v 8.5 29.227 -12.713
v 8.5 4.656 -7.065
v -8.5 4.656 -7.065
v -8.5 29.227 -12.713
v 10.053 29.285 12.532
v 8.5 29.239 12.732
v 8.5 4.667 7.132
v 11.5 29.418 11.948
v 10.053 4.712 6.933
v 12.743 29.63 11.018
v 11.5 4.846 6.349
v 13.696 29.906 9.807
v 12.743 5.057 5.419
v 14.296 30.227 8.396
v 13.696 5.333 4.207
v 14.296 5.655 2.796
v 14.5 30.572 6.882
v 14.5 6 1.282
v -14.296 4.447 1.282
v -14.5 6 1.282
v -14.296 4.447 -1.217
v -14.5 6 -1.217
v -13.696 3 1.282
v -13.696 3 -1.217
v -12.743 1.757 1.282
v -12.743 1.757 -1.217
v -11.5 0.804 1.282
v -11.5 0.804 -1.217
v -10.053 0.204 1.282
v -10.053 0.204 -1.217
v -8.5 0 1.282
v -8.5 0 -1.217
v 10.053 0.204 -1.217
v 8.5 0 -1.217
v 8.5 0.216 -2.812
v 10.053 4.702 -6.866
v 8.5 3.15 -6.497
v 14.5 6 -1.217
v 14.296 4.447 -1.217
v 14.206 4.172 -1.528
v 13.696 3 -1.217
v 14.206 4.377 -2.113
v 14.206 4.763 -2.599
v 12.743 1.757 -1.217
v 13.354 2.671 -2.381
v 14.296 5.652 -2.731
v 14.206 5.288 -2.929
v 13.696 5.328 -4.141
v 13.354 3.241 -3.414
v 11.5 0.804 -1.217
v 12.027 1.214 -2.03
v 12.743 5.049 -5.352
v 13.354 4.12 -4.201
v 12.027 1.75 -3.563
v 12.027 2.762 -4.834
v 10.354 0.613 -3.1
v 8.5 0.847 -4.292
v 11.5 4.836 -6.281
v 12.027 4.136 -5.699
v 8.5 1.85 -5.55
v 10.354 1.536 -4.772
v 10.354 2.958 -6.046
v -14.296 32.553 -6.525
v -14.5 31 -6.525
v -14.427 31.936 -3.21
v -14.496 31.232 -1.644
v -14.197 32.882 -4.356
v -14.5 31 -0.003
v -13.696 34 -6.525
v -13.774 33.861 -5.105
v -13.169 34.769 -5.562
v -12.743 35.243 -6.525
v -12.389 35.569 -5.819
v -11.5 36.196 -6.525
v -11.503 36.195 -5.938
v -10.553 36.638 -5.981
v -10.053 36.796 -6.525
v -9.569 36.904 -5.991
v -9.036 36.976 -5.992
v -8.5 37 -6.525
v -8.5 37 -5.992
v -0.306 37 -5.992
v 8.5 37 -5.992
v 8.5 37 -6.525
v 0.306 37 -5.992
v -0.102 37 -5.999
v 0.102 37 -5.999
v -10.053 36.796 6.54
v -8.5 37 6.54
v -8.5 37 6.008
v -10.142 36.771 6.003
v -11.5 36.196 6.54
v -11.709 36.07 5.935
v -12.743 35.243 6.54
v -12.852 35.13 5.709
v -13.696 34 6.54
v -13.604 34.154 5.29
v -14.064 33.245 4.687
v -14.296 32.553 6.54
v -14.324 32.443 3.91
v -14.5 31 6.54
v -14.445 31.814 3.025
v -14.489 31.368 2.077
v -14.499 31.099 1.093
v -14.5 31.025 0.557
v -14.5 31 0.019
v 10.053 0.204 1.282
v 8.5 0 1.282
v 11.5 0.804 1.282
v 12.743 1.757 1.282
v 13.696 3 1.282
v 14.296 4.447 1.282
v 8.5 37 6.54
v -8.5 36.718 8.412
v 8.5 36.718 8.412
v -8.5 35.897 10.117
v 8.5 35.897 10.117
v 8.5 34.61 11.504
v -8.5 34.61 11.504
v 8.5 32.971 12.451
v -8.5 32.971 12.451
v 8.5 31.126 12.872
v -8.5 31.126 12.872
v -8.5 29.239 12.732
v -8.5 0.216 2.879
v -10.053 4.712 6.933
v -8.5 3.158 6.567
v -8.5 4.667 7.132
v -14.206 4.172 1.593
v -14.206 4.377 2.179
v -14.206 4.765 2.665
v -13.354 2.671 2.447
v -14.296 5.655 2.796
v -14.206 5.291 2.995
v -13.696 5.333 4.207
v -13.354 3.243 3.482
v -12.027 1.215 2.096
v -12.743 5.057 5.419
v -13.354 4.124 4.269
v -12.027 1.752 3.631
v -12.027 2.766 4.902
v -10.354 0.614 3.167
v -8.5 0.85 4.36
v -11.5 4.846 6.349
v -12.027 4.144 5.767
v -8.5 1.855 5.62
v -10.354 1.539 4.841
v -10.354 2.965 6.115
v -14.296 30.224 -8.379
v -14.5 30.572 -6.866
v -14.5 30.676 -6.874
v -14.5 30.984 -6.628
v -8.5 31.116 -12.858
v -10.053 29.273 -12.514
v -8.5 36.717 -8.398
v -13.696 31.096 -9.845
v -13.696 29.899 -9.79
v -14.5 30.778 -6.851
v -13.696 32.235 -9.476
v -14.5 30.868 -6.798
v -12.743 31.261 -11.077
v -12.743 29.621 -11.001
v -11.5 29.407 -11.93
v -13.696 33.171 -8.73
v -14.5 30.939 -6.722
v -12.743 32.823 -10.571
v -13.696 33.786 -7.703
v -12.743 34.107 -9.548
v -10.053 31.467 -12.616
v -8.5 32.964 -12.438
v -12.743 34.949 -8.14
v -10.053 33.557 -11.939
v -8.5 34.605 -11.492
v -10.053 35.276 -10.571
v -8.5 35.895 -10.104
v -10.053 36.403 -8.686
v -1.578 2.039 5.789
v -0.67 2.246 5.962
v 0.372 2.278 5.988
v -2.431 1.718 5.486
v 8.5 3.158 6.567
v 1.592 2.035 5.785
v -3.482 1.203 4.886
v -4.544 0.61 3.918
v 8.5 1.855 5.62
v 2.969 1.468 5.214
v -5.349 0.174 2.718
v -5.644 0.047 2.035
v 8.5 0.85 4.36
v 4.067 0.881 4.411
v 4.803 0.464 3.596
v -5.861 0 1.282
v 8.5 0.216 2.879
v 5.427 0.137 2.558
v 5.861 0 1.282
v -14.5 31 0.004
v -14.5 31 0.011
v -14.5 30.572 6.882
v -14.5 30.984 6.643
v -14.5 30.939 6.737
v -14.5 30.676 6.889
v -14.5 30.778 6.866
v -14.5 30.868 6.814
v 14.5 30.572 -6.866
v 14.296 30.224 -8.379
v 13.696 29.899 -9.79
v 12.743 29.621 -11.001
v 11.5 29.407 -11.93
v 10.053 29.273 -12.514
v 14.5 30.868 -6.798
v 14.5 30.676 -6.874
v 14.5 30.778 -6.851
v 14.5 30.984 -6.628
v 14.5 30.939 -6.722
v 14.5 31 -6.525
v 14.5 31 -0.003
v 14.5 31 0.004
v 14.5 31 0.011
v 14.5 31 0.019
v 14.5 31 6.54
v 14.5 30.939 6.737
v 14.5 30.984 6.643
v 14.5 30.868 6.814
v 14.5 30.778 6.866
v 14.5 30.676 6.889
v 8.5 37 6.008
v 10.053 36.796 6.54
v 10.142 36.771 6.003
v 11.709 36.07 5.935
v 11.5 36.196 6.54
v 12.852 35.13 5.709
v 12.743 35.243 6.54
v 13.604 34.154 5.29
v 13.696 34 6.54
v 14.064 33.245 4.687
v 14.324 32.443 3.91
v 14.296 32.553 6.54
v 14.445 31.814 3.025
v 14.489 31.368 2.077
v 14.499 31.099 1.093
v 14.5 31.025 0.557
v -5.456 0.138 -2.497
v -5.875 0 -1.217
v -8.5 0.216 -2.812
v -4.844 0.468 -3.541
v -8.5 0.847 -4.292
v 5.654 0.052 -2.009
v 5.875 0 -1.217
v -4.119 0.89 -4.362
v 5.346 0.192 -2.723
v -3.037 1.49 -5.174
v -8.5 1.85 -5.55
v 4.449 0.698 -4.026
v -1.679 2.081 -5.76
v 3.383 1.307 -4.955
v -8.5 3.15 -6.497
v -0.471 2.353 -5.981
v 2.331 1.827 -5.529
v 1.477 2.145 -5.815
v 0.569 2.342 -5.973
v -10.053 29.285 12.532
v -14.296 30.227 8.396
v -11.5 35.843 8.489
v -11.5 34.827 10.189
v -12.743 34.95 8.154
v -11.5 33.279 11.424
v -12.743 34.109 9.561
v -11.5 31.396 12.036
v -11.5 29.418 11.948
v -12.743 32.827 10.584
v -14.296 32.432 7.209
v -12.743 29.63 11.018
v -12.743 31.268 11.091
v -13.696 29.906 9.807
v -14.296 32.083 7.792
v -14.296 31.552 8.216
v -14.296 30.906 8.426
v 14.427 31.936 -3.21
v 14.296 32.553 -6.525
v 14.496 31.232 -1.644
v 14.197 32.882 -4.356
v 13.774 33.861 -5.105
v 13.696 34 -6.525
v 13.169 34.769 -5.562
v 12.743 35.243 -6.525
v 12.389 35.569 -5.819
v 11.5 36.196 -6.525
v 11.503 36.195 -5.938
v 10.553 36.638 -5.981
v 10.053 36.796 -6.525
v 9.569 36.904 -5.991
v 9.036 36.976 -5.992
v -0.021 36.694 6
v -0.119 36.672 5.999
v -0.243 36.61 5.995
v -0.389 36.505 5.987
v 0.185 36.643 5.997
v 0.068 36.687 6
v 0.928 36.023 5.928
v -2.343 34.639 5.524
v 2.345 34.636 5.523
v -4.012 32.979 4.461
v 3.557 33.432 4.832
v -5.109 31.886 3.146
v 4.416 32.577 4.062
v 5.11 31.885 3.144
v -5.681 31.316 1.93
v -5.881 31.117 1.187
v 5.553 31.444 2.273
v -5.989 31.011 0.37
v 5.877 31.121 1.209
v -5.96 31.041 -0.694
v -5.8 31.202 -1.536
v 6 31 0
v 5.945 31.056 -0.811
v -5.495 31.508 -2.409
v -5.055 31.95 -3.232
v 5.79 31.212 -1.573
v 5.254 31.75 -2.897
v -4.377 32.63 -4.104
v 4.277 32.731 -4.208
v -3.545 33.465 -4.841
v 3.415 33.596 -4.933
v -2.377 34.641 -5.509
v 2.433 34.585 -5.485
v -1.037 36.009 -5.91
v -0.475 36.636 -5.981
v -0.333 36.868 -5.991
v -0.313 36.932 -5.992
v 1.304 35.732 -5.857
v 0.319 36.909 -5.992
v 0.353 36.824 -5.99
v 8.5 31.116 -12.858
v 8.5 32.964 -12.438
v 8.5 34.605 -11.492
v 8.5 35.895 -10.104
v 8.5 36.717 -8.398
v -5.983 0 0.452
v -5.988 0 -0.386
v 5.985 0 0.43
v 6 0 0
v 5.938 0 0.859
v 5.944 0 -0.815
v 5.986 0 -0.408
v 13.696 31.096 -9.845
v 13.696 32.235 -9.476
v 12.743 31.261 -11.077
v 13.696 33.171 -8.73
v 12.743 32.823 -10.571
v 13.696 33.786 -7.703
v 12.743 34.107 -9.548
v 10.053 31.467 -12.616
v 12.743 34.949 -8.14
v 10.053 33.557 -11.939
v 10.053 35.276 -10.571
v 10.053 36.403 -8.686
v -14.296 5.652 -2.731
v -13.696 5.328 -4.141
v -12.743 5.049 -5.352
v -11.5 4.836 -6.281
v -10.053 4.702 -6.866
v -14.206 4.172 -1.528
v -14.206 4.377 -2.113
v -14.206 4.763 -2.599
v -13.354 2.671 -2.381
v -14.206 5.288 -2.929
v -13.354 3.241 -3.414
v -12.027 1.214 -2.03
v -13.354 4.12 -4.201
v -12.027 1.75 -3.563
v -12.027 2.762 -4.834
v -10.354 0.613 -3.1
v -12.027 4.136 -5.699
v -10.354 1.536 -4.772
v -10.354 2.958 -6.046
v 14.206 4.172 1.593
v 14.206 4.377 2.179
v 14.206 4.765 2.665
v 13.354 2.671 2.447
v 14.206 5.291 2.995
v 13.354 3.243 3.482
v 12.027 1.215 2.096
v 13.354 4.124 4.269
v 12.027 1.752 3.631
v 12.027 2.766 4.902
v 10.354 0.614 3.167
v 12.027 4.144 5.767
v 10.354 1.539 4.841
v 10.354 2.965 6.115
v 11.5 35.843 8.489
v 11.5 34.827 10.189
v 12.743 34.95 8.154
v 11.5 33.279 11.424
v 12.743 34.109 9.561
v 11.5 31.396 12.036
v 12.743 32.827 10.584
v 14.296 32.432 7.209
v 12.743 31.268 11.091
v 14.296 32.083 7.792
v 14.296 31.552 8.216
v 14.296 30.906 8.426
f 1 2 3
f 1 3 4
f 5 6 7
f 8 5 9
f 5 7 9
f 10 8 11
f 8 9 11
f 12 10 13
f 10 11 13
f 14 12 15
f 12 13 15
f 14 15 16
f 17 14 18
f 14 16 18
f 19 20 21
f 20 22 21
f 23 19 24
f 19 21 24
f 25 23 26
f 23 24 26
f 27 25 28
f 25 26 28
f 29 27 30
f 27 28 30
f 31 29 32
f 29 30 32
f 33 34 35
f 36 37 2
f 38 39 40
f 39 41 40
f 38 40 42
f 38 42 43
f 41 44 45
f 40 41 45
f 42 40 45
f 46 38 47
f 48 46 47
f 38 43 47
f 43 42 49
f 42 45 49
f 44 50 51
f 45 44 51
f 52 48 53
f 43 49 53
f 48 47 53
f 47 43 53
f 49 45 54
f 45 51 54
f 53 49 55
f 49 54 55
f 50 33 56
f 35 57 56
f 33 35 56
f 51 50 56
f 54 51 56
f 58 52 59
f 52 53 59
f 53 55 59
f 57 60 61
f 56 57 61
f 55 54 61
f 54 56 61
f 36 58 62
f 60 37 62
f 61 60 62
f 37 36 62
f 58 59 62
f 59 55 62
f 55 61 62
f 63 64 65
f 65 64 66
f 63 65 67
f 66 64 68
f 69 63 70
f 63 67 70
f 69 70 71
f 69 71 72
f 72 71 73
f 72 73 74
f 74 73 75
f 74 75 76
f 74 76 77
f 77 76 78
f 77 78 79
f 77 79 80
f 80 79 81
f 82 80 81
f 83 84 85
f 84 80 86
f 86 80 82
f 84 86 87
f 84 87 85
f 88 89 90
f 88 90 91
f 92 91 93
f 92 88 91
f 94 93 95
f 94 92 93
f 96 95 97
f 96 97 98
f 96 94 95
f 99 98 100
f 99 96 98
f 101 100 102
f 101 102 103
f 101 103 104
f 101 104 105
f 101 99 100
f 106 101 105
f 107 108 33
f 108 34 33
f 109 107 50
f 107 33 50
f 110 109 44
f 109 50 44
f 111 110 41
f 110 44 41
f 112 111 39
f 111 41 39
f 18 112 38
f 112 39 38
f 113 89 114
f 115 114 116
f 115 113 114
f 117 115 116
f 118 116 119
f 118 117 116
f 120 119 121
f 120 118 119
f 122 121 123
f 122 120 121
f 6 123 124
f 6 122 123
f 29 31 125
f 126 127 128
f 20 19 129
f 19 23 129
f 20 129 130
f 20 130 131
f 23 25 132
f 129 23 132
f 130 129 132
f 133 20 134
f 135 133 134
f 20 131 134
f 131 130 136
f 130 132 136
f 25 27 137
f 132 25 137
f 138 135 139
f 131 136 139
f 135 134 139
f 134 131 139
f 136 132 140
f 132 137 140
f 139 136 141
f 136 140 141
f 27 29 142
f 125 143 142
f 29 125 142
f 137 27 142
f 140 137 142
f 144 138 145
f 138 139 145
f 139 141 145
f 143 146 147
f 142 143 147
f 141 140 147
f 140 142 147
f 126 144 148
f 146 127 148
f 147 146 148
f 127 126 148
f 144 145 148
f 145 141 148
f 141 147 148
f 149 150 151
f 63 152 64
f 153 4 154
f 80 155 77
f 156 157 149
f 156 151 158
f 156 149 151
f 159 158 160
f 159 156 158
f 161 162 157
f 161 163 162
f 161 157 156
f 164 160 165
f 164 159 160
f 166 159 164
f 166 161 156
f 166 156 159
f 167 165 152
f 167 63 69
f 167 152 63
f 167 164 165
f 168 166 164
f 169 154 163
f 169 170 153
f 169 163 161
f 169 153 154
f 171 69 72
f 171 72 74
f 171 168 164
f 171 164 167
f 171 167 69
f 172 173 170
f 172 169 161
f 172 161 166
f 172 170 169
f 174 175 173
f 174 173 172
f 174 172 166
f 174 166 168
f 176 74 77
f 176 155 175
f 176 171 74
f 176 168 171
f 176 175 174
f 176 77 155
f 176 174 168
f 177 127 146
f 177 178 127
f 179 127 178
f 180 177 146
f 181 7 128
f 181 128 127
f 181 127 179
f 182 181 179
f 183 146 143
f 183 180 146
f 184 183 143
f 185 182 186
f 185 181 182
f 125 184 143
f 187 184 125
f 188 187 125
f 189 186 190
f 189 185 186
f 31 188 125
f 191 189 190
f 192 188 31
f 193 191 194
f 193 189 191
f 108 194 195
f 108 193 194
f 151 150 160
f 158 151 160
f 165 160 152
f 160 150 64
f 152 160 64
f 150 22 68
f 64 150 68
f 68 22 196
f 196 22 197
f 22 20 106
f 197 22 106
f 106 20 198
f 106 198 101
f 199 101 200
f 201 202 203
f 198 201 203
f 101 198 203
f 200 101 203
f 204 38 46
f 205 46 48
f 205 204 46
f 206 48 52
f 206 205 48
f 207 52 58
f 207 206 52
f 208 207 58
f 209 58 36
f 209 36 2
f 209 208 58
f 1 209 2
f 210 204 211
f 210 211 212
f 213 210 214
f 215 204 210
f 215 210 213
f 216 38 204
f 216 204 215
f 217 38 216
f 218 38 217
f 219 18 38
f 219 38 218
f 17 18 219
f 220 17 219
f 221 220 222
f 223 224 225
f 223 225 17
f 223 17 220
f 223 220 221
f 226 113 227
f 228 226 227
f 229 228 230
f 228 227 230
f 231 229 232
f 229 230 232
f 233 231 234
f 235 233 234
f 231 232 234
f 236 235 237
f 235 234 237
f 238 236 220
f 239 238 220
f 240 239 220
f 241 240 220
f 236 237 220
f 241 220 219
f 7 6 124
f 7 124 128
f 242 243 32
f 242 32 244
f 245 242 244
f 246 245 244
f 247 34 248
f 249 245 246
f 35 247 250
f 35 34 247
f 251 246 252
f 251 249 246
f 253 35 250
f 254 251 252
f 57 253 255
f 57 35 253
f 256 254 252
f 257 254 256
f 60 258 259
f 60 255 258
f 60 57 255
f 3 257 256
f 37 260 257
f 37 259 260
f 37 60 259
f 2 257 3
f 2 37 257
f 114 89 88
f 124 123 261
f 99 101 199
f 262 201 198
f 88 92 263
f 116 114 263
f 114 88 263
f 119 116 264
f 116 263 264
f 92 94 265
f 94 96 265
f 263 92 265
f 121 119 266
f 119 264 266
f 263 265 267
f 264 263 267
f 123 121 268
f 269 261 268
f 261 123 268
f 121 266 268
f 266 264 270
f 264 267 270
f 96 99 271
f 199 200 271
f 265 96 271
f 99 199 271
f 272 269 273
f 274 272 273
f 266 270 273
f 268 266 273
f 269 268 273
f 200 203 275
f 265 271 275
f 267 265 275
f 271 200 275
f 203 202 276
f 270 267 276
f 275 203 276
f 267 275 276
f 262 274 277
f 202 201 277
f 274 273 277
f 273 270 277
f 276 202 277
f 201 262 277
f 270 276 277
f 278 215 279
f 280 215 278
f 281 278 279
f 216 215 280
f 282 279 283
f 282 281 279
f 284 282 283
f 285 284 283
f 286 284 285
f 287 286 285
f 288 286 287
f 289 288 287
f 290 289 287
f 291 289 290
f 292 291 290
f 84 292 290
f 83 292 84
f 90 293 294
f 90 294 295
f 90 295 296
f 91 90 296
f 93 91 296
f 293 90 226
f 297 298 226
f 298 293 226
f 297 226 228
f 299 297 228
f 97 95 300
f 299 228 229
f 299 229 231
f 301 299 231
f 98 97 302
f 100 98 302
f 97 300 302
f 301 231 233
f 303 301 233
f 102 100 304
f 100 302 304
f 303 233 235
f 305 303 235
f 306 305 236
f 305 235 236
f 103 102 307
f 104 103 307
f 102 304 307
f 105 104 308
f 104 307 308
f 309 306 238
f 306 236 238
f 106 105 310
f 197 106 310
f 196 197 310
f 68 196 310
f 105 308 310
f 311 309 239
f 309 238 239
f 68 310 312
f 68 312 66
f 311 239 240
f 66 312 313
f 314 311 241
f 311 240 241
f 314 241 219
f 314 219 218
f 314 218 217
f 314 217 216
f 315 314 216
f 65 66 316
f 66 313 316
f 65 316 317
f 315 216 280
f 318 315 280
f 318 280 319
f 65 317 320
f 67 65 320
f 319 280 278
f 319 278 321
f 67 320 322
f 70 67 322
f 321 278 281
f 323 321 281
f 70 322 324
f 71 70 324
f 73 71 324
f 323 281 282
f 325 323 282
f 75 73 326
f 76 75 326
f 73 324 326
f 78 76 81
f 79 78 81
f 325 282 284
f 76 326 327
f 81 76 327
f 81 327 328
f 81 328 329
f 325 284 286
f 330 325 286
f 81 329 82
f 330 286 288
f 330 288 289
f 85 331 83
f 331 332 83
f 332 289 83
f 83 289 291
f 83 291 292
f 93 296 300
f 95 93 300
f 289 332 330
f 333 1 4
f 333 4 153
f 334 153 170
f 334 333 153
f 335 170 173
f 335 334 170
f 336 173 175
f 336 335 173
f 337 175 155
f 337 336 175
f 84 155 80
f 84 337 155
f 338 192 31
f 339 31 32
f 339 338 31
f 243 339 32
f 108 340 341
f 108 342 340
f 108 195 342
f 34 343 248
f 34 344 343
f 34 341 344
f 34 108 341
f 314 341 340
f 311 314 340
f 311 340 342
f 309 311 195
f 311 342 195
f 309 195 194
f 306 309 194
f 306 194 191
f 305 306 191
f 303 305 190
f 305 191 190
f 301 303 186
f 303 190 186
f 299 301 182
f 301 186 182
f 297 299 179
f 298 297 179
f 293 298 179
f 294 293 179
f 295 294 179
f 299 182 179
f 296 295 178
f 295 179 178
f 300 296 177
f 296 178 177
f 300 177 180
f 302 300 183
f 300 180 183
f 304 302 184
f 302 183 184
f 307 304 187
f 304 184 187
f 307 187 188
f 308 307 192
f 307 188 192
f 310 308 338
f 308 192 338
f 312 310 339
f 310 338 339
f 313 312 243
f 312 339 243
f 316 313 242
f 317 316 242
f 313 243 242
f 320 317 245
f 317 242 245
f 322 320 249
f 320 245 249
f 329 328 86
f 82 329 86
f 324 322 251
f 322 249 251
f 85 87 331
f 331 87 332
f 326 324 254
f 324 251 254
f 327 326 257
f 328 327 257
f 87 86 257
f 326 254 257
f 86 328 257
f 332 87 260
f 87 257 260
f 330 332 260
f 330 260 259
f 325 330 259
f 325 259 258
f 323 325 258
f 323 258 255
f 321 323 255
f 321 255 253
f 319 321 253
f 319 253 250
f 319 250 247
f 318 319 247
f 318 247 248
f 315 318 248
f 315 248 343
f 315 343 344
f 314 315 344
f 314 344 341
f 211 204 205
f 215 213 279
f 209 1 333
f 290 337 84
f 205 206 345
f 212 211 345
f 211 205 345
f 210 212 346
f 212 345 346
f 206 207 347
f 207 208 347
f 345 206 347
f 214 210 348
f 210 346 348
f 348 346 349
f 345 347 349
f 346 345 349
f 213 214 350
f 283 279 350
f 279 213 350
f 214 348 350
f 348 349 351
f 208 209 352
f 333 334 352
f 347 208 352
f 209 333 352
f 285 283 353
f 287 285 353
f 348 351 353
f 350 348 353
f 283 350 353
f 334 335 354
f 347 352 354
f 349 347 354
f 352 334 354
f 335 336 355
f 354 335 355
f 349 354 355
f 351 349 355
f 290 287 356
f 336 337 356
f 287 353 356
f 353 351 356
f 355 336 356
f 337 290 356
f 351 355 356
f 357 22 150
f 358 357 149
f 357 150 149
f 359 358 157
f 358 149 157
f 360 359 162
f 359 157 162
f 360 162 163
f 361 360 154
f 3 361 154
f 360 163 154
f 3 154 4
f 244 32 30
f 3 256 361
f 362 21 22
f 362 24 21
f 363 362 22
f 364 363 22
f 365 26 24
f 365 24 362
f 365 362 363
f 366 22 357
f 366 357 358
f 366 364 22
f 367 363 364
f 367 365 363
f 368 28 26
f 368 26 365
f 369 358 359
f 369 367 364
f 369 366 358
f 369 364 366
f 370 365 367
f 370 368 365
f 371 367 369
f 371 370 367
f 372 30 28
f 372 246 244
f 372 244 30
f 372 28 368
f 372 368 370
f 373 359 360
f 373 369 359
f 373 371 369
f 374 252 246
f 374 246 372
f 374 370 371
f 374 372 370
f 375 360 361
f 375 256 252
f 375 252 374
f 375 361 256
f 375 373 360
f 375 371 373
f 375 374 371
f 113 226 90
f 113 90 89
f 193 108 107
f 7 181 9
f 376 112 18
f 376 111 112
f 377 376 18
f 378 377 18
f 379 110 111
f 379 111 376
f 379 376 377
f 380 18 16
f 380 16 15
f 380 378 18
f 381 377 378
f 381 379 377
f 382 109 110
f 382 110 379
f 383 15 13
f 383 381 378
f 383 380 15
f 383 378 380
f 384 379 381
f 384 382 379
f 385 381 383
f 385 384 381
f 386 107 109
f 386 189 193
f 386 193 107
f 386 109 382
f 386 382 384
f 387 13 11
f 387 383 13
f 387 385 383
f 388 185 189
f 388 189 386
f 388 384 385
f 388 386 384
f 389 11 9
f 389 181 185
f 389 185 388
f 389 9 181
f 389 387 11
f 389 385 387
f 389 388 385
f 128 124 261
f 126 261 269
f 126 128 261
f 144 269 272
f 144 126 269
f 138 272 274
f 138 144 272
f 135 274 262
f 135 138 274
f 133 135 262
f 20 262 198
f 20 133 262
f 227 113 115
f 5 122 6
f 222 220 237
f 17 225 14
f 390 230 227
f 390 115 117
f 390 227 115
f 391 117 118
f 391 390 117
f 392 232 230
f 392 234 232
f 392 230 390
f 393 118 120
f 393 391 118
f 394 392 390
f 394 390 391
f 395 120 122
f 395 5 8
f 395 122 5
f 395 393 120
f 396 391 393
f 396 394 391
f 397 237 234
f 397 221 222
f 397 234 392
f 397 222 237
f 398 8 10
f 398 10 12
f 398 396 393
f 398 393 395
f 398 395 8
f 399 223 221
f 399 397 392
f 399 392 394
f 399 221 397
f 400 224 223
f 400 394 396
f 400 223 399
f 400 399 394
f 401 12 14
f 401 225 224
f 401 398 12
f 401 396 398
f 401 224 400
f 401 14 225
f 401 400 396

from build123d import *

# Parameters (mm, degrees)
F2_DEPTH = 14.5
F4_DEPTH = 29.001
F5_R     = 5.99999
F0_R     = 6
F6_DEPTH = 87.122


# Not quite as in the source:
# - a fillet or chamfer is up to 0.001 mm smaller than in the source, because OpenCascade refuses the exact size


with BuildPart() as f2:
    # F1 (on Right) → F2 (new body, symmetric)
    with BuildSketch(Plane.YZ):
        with BuildLine():
            Line((29.2391964545, 12.7315542681), (0, 6.0688508675))
            Line((0, 6.0688508675), (0, -5.9945774265))
            Line((0, -5.9945774265), (29.2273893105, -12.7132611239))
            ThreePointArc((29.2273893105, -12.7132611239), (34.6053079603, -11.4923680491), (37, -6.524668487))
            Line((37, -6.524668487), (37, 6.5402593021))
            ThreePointArc((37, 6.5402593021), (34.610044033, 11.5041842871), (29.2391964545, 12.7315542681))
        make_face()
    extrude(amount=F2_DEPTH, both=True)

    # F3 (on face) → F4 (cut, through all)
    with BuildSketch(Plane.YZ.offset(14.5)):
        with BuildLine():
            Line((37, -5.9922045925), (37, 6.0077954075))
            ThreePointArc((37, 6.0077954075), (31, 0.0077954075), (37, -5.9922045925))
        make_face()
    extrude(amount=-F4_DEPTH, mode=Mode.SUBTRACT)

    # F5 (radius 6 in the source; OpenCascade refuses exactly that, so slightly less here)
    f5_edges = [f2.edges().sort_by_distance(p)[0] for p in [
        (14.5, 14.619598, 9.400203),
        (14.5, 14.613695, -9.353919),
        (0, 37, 6.540259),
        (-14.5, 14.619598, 9.400203),
        (-14.5, 14.613695, -9.353919),
        (0, 0, -5.994577),
        (0, 0, 6.068851),
        (14.5, 0, 0.037137),
        (-14.5, 0, 0.037137),
    ]]
    fillet(f5_edges, radius=F5_R)

    # F0 (on Front) → F6 (cut)
    with BuildSketch(Plane.XZ):
        Circle(F0_R)
    extrude(amount=-F6_DEPTH, mode=Mode.SUBTRACT)


solid = f2.part
